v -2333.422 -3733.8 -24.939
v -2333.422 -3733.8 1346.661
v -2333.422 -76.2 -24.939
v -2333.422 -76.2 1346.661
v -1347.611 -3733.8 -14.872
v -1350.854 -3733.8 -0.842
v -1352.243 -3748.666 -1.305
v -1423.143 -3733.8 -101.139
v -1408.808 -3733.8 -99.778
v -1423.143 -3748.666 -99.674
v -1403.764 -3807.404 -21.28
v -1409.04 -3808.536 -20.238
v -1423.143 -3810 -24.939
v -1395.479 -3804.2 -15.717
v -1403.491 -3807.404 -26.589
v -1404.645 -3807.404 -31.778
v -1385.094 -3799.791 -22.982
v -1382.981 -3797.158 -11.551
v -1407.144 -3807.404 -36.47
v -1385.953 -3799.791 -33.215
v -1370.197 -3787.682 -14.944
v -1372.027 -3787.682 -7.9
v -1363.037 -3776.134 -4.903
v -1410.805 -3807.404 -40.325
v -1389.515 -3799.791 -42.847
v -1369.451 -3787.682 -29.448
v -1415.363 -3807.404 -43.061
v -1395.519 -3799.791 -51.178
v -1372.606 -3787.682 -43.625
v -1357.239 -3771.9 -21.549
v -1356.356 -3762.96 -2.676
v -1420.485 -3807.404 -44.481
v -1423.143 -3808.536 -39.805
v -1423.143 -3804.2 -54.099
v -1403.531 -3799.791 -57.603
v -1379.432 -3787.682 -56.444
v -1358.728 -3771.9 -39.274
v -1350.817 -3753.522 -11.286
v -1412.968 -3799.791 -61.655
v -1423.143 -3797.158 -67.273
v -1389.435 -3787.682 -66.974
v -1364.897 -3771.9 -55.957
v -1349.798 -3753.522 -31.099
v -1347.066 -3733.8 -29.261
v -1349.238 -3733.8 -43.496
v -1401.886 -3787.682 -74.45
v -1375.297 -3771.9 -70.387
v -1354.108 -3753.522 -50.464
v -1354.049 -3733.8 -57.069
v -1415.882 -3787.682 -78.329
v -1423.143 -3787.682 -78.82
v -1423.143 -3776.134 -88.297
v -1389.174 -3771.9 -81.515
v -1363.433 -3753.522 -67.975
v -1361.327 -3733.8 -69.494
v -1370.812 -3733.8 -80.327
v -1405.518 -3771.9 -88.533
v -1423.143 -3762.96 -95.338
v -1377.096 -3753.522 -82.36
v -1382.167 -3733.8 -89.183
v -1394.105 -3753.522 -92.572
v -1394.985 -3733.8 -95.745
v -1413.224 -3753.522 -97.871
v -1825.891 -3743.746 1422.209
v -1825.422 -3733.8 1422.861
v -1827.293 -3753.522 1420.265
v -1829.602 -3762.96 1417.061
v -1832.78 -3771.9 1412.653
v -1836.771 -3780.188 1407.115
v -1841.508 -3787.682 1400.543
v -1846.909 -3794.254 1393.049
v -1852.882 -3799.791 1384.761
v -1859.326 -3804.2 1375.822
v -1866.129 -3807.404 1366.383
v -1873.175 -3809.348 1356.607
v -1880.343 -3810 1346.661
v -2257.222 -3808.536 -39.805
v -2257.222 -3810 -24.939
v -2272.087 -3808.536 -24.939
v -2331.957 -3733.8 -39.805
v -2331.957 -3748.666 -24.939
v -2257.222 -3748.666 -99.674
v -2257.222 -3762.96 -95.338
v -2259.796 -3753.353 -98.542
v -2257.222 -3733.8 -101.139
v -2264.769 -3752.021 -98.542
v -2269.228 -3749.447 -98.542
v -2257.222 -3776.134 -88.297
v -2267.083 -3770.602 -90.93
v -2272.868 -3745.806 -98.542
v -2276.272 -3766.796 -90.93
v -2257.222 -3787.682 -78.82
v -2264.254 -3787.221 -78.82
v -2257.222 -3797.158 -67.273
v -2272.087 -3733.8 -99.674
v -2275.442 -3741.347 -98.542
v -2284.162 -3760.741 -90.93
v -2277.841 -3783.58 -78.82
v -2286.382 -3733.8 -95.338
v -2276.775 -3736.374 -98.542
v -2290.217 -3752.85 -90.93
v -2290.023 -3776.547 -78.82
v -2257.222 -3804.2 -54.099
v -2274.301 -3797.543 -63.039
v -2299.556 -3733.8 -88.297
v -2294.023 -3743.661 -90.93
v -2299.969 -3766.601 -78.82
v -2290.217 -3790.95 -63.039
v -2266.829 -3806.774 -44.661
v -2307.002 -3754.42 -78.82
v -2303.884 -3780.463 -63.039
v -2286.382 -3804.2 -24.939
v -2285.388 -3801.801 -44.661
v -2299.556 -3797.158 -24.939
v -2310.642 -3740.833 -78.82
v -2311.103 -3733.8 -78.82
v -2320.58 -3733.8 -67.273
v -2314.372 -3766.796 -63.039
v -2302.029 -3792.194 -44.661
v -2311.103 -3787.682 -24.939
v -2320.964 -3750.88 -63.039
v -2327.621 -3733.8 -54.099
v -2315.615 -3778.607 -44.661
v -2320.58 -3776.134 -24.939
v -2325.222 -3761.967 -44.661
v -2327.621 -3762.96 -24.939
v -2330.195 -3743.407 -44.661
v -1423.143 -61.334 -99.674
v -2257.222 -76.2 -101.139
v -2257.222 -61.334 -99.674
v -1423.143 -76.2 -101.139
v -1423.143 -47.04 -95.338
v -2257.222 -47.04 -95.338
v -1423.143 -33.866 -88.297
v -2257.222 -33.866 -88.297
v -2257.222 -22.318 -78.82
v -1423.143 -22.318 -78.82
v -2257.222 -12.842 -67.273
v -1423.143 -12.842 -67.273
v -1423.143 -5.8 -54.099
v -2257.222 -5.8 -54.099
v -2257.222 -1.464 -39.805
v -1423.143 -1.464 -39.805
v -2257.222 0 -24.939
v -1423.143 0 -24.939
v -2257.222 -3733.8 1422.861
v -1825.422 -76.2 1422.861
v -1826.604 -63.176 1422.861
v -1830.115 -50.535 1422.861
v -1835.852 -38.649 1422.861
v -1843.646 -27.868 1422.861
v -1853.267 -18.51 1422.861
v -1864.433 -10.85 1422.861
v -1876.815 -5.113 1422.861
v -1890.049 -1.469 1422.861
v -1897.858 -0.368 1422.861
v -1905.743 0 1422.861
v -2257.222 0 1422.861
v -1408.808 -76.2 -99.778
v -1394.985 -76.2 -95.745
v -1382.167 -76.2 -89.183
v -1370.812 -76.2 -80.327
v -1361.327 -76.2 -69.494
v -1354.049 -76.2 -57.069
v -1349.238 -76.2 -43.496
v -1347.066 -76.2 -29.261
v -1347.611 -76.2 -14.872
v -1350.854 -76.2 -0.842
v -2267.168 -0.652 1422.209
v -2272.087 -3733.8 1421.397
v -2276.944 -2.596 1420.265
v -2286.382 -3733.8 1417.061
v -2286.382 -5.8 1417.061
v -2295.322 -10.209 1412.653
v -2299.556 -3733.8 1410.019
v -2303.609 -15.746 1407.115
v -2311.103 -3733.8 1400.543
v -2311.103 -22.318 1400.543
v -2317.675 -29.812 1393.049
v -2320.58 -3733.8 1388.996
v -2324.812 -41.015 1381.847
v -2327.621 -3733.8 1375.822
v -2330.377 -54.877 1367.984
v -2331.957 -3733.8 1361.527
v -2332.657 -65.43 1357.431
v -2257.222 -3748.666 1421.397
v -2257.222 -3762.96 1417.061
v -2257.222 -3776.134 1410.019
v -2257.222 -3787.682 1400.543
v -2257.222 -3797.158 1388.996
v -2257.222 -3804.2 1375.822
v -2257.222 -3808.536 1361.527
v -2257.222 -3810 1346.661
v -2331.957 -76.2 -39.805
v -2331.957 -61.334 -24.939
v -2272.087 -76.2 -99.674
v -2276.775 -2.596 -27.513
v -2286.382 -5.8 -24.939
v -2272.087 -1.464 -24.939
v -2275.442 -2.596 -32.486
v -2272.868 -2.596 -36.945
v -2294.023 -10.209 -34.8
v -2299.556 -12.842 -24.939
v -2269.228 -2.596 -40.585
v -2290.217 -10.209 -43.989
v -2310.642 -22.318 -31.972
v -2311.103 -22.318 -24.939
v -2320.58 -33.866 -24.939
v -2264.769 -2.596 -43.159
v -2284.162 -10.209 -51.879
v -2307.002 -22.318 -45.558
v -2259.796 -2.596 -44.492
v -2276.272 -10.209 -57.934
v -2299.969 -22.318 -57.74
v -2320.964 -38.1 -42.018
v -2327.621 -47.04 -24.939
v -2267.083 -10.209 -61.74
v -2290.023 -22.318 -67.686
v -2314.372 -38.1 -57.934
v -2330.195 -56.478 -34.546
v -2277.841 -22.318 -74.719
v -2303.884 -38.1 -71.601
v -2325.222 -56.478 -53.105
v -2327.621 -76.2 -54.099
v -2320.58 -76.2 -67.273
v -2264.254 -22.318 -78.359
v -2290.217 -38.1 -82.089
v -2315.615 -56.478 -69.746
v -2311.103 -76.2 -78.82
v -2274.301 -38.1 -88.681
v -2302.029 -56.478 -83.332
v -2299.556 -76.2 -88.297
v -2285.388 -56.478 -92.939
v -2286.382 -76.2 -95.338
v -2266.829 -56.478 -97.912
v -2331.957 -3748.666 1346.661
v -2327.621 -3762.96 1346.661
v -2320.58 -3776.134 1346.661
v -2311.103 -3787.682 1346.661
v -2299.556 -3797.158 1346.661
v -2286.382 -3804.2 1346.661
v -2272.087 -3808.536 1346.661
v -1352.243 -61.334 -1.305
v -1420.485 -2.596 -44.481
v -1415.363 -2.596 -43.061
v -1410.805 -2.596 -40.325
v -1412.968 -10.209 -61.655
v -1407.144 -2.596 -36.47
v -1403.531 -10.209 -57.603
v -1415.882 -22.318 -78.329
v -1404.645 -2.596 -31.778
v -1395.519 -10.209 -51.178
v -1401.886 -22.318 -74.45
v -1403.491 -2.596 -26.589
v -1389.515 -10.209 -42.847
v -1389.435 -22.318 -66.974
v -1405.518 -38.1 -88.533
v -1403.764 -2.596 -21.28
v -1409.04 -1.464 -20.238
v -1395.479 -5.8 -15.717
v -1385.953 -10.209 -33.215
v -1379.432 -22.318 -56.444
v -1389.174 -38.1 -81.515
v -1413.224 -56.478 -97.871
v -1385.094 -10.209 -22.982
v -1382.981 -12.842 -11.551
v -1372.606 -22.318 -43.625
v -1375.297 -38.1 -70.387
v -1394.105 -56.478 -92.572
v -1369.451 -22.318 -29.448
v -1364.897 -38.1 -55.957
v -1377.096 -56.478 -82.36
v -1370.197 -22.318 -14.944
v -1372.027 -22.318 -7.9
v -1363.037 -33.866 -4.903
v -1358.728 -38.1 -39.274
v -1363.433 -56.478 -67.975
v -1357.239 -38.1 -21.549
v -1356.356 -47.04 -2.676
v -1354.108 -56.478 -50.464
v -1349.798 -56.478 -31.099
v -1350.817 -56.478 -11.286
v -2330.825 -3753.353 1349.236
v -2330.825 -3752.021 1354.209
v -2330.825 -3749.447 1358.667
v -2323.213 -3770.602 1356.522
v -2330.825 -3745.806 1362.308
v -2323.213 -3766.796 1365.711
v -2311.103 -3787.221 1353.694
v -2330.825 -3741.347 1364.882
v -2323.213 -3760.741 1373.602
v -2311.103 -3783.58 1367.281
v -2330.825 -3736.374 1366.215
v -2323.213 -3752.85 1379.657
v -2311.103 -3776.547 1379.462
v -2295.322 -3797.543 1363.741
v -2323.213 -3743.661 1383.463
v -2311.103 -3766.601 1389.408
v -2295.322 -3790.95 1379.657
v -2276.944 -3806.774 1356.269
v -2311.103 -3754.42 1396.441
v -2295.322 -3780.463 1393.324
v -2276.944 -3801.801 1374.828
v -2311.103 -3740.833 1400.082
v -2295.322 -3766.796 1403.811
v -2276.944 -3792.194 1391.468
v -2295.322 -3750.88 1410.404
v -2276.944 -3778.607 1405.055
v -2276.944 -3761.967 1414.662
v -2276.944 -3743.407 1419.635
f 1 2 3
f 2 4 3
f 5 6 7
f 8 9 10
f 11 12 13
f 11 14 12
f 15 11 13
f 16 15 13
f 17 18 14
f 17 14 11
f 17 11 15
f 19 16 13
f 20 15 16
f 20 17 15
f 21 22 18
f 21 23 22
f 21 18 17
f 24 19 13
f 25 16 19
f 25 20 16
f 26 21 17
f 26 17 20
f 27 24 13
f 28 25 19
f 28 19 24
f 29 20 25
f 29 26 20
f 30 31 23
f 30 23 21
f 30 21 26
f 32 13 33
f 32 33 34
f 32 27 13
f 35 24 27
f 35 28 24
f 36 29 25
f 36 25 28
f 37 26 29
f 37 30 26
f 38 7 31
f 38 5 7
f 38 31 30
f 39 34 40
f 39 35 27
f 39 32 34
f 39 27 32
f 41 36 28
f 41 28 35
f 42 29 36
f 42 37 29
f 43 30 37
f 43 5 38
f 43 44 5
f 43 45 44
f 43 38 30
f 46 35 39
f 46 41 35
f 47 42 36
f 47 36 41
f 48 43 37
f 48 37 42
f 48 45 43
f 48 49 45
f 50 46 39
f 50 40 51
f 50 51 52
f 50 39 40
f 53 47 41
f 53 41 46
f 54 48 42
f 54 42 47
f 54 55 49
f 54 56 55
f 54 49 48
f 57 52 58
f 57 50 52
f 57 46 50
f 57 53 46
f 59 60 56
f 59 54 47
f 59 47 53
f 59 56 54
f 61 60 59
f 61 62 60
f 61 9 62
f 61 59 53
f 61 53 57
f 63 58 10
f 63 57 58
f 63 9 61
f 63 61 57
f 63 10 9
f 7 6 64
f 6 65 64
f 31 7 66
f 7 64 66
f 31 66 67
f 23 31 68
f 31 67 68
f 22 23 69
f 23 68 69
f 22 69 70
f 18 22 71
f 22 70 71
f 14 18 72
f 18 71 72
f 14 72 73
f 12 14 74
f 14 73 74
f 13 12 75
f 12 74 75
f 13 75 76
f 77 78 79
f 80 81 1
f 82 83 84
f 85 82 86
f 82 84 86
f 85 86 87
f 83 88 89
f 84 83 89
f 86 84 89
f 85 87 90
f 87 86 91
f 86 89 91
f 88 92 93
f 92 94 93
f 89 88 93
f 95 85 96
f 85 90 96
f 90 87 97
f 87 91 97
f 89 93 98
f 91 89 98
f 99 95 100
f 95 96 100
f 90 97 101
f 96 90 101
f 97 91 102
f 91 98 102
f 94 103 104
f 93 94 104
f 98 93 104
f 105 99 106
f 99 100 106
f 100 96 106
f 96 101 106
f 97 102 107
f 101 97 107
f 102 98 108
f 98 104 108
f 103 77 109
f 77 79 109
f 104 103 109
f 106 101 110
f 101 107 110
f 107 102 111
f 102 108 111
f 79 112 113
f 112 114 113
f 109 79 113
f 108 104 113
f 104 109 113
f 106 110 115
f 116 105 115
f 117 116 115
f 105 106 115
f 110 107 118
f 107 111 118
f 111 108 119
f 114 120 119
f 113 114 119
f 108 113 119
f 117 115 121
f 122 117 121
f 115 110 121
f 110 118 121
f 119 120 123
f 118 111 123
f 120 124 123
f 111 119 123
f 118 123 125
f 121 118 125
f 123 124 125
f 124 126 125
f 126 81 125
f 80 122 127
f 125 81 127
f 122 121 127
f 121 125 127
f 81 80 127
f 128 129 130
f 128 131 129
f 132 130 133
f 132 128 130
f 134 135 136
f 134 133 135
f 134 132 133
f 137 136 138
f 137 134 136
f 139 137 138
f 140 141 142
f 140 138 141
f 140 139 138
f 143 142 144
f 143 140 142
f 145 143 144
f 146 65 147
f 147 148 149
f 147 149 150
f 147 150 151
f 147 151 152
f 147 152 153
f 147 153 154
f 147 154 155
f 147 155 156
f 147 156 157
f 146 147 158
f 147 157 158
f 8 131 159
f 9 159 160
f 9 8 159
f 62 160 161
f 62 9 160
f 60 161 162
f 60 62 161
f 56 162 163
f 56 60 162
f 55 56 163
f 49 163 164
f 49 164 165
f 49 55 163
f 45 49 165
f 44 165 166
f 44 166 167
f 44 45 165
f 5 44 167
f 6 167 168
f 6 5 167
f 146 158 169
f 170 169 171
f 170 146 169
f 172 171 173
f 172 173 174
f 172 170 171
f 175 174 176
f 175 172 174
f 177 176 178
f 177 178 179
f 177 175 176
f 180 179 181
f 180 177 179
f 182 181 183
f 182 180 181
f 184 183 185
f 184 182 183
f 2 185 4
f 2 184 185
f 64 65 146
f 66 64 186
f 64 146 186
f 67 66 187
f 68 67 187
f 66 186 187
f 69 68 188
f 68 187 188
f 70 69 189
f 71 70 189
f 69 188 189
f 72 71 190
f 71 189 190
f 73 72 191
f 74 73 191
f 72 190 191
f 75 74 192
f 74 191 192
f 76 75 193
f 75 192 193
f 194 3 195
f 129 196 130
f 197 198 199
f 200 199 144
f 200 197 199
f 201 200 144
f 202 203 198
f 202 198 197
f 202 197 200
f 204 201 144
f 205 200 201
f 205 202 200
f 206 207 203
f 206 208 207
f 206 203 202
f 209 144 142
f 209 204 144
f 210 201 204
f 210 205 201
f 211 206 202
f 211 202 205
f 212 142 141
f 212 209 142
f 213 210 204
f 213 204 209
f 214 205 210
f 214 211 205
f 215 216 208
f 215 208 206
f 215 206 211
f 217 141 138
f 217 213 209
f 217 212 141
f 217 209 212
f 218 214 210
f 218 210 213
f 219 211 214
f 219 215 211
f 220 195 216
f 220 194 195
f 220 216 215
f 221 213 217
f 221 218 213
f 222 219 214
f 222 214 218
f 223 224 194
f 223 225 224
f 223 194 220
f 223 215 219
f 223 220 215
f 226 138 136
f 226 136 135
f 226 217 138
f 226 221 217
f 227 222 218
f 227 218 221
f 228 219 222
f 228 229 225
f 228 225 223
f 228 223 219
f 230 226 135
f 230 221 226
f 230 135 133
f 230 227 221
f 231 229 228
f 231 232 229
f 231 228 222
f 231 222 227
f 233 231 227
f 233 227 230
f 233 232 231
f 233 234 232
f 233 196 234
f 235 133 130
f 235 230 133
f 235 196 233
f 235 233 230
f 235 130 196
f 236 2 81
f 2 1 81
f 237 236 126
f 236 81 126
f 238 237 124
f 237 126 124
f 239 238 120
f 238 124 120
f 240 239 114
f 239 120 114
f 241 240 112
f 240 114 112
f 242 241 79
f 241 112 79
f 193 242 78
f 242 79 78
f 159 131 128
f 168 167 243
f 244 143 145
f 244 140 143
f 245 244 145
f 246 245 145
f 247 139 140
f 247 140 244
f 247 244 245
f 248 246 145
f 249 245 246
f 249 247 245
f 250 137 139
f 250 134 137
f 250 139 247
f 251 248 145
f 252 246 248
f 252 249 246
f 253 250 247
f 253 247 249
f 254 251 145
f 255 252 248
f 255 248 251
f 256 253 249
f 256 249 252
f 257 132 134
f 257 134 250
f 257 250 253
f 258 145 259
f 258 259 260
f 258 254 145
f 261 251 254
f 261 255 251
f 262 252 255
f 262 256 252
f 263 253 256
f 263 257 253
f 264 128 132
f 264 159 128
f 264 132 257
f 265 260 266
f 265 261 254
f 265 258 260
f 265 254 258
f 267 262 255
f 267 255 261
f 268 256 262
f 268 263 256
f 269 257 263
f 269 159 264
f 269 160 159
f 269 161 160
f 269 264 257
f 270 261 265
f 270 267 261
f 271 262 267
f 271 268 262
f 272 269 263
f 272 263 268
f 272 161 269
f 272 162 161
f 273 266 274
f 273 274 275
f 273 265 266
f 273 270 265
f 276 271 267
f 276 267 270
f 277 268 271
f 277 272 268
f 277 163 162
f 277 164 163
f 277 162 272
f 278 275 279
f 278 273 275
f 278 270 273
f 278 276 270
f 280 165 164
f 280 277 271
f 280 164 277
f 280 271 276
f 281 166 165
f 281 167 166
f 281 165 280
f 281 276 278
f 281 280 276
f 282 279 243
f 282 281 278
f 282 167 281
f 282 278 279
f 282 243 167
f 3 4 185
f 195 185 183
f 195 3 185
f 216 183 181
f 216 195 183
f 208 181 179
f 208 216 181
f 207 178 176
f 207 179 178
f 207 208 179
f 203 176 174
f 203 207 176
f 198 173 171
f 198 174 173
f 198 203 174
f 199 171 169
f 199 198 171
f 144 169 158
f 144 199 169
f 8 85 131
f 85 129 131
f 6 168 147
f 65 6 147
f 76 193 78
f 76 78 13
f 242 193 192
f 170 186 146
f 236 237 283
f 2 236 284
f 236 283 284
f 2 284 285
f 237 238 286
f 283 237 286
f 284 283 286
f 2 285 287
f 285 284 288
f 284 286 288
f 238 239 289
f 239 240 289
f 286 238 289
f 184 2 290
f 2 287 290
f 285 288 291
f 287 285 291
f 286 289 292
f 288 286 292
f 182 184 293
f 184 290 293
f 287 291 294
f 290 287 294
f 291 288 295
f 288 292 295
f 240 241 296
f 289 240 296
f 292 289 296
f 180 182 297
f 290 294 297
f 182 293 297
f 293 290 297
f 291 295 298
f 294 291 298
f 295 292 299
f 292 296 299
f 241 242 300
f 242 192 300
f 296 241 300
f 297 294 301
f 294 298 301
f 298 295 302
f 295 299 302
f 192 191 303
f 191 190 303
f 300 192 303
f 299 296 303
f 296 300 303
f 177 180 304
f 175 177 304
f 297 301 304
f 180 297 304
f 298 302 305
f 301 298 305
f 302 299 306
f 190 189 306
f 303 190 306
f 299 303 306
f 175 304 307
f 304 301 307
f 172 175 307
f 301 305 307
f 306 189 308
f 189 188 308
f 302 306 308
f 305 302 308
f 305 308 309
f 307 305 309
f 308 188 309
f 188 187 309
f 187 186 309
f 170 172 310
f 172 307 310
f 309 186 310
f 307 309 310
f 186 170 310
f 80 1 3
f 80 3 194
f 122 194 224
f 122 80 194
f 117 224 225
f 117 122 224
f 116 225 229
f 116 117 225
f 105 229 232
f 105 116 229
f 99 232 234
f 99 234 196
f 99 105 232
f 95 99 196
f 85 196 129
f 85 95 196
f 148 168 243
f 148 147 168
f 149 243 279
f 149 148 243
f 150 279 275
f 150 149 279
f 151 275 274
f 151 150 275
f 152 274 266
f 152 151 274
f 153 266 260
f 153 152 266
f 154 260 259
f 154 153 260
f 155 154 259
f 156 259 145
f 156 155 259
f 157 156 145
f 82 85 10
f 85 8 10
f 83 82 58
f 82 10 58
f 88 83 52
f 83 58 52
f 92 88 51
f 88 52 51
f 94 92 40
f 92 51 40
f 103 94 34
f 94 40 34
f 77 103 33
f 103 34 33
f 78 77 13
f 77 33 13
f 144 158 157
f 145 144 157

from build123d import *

# Parameters (mm, degrees)
F1_DEPTH = 3810
F2_R     = 76.2


with BuildPart() as f1:
    # F0 (on Front) → F1 (new body)
    with BuildSketch(Plane.XZ):
        Polygon((-1825.421534, 1422.861372), (-2333.421534, 1422.861372), (-2333.421534, -101.138628), (-1317.421534, -101.138628), align=None)
    extrude(amount=F1_DEPTH)

    # F2
    f2_edges = [f1.edges().sort_by_distance(p)[0] for p in [
        (-1571.421534, -3810, 660.861372),
        (-1571.421534, 0, 660.861372),
        (-2079.421534, -3810, 1422.861372),
        (-2333.421534, -3810, 660.861372),
        (-1825.421534, -3810, -101.138628),
        (-2333.421534, -1905, 1422.861372),
        (-2333.421534, -1905, -101.138628),
        (-2333.421534, 0, 660.861372),
        (-1317.421534, -1905, -101.138628),
        (-1825.421534, 0, -101.138628),
    ]]
    fillet(f2_edges, radius=F2_R)


solid = f1.part
